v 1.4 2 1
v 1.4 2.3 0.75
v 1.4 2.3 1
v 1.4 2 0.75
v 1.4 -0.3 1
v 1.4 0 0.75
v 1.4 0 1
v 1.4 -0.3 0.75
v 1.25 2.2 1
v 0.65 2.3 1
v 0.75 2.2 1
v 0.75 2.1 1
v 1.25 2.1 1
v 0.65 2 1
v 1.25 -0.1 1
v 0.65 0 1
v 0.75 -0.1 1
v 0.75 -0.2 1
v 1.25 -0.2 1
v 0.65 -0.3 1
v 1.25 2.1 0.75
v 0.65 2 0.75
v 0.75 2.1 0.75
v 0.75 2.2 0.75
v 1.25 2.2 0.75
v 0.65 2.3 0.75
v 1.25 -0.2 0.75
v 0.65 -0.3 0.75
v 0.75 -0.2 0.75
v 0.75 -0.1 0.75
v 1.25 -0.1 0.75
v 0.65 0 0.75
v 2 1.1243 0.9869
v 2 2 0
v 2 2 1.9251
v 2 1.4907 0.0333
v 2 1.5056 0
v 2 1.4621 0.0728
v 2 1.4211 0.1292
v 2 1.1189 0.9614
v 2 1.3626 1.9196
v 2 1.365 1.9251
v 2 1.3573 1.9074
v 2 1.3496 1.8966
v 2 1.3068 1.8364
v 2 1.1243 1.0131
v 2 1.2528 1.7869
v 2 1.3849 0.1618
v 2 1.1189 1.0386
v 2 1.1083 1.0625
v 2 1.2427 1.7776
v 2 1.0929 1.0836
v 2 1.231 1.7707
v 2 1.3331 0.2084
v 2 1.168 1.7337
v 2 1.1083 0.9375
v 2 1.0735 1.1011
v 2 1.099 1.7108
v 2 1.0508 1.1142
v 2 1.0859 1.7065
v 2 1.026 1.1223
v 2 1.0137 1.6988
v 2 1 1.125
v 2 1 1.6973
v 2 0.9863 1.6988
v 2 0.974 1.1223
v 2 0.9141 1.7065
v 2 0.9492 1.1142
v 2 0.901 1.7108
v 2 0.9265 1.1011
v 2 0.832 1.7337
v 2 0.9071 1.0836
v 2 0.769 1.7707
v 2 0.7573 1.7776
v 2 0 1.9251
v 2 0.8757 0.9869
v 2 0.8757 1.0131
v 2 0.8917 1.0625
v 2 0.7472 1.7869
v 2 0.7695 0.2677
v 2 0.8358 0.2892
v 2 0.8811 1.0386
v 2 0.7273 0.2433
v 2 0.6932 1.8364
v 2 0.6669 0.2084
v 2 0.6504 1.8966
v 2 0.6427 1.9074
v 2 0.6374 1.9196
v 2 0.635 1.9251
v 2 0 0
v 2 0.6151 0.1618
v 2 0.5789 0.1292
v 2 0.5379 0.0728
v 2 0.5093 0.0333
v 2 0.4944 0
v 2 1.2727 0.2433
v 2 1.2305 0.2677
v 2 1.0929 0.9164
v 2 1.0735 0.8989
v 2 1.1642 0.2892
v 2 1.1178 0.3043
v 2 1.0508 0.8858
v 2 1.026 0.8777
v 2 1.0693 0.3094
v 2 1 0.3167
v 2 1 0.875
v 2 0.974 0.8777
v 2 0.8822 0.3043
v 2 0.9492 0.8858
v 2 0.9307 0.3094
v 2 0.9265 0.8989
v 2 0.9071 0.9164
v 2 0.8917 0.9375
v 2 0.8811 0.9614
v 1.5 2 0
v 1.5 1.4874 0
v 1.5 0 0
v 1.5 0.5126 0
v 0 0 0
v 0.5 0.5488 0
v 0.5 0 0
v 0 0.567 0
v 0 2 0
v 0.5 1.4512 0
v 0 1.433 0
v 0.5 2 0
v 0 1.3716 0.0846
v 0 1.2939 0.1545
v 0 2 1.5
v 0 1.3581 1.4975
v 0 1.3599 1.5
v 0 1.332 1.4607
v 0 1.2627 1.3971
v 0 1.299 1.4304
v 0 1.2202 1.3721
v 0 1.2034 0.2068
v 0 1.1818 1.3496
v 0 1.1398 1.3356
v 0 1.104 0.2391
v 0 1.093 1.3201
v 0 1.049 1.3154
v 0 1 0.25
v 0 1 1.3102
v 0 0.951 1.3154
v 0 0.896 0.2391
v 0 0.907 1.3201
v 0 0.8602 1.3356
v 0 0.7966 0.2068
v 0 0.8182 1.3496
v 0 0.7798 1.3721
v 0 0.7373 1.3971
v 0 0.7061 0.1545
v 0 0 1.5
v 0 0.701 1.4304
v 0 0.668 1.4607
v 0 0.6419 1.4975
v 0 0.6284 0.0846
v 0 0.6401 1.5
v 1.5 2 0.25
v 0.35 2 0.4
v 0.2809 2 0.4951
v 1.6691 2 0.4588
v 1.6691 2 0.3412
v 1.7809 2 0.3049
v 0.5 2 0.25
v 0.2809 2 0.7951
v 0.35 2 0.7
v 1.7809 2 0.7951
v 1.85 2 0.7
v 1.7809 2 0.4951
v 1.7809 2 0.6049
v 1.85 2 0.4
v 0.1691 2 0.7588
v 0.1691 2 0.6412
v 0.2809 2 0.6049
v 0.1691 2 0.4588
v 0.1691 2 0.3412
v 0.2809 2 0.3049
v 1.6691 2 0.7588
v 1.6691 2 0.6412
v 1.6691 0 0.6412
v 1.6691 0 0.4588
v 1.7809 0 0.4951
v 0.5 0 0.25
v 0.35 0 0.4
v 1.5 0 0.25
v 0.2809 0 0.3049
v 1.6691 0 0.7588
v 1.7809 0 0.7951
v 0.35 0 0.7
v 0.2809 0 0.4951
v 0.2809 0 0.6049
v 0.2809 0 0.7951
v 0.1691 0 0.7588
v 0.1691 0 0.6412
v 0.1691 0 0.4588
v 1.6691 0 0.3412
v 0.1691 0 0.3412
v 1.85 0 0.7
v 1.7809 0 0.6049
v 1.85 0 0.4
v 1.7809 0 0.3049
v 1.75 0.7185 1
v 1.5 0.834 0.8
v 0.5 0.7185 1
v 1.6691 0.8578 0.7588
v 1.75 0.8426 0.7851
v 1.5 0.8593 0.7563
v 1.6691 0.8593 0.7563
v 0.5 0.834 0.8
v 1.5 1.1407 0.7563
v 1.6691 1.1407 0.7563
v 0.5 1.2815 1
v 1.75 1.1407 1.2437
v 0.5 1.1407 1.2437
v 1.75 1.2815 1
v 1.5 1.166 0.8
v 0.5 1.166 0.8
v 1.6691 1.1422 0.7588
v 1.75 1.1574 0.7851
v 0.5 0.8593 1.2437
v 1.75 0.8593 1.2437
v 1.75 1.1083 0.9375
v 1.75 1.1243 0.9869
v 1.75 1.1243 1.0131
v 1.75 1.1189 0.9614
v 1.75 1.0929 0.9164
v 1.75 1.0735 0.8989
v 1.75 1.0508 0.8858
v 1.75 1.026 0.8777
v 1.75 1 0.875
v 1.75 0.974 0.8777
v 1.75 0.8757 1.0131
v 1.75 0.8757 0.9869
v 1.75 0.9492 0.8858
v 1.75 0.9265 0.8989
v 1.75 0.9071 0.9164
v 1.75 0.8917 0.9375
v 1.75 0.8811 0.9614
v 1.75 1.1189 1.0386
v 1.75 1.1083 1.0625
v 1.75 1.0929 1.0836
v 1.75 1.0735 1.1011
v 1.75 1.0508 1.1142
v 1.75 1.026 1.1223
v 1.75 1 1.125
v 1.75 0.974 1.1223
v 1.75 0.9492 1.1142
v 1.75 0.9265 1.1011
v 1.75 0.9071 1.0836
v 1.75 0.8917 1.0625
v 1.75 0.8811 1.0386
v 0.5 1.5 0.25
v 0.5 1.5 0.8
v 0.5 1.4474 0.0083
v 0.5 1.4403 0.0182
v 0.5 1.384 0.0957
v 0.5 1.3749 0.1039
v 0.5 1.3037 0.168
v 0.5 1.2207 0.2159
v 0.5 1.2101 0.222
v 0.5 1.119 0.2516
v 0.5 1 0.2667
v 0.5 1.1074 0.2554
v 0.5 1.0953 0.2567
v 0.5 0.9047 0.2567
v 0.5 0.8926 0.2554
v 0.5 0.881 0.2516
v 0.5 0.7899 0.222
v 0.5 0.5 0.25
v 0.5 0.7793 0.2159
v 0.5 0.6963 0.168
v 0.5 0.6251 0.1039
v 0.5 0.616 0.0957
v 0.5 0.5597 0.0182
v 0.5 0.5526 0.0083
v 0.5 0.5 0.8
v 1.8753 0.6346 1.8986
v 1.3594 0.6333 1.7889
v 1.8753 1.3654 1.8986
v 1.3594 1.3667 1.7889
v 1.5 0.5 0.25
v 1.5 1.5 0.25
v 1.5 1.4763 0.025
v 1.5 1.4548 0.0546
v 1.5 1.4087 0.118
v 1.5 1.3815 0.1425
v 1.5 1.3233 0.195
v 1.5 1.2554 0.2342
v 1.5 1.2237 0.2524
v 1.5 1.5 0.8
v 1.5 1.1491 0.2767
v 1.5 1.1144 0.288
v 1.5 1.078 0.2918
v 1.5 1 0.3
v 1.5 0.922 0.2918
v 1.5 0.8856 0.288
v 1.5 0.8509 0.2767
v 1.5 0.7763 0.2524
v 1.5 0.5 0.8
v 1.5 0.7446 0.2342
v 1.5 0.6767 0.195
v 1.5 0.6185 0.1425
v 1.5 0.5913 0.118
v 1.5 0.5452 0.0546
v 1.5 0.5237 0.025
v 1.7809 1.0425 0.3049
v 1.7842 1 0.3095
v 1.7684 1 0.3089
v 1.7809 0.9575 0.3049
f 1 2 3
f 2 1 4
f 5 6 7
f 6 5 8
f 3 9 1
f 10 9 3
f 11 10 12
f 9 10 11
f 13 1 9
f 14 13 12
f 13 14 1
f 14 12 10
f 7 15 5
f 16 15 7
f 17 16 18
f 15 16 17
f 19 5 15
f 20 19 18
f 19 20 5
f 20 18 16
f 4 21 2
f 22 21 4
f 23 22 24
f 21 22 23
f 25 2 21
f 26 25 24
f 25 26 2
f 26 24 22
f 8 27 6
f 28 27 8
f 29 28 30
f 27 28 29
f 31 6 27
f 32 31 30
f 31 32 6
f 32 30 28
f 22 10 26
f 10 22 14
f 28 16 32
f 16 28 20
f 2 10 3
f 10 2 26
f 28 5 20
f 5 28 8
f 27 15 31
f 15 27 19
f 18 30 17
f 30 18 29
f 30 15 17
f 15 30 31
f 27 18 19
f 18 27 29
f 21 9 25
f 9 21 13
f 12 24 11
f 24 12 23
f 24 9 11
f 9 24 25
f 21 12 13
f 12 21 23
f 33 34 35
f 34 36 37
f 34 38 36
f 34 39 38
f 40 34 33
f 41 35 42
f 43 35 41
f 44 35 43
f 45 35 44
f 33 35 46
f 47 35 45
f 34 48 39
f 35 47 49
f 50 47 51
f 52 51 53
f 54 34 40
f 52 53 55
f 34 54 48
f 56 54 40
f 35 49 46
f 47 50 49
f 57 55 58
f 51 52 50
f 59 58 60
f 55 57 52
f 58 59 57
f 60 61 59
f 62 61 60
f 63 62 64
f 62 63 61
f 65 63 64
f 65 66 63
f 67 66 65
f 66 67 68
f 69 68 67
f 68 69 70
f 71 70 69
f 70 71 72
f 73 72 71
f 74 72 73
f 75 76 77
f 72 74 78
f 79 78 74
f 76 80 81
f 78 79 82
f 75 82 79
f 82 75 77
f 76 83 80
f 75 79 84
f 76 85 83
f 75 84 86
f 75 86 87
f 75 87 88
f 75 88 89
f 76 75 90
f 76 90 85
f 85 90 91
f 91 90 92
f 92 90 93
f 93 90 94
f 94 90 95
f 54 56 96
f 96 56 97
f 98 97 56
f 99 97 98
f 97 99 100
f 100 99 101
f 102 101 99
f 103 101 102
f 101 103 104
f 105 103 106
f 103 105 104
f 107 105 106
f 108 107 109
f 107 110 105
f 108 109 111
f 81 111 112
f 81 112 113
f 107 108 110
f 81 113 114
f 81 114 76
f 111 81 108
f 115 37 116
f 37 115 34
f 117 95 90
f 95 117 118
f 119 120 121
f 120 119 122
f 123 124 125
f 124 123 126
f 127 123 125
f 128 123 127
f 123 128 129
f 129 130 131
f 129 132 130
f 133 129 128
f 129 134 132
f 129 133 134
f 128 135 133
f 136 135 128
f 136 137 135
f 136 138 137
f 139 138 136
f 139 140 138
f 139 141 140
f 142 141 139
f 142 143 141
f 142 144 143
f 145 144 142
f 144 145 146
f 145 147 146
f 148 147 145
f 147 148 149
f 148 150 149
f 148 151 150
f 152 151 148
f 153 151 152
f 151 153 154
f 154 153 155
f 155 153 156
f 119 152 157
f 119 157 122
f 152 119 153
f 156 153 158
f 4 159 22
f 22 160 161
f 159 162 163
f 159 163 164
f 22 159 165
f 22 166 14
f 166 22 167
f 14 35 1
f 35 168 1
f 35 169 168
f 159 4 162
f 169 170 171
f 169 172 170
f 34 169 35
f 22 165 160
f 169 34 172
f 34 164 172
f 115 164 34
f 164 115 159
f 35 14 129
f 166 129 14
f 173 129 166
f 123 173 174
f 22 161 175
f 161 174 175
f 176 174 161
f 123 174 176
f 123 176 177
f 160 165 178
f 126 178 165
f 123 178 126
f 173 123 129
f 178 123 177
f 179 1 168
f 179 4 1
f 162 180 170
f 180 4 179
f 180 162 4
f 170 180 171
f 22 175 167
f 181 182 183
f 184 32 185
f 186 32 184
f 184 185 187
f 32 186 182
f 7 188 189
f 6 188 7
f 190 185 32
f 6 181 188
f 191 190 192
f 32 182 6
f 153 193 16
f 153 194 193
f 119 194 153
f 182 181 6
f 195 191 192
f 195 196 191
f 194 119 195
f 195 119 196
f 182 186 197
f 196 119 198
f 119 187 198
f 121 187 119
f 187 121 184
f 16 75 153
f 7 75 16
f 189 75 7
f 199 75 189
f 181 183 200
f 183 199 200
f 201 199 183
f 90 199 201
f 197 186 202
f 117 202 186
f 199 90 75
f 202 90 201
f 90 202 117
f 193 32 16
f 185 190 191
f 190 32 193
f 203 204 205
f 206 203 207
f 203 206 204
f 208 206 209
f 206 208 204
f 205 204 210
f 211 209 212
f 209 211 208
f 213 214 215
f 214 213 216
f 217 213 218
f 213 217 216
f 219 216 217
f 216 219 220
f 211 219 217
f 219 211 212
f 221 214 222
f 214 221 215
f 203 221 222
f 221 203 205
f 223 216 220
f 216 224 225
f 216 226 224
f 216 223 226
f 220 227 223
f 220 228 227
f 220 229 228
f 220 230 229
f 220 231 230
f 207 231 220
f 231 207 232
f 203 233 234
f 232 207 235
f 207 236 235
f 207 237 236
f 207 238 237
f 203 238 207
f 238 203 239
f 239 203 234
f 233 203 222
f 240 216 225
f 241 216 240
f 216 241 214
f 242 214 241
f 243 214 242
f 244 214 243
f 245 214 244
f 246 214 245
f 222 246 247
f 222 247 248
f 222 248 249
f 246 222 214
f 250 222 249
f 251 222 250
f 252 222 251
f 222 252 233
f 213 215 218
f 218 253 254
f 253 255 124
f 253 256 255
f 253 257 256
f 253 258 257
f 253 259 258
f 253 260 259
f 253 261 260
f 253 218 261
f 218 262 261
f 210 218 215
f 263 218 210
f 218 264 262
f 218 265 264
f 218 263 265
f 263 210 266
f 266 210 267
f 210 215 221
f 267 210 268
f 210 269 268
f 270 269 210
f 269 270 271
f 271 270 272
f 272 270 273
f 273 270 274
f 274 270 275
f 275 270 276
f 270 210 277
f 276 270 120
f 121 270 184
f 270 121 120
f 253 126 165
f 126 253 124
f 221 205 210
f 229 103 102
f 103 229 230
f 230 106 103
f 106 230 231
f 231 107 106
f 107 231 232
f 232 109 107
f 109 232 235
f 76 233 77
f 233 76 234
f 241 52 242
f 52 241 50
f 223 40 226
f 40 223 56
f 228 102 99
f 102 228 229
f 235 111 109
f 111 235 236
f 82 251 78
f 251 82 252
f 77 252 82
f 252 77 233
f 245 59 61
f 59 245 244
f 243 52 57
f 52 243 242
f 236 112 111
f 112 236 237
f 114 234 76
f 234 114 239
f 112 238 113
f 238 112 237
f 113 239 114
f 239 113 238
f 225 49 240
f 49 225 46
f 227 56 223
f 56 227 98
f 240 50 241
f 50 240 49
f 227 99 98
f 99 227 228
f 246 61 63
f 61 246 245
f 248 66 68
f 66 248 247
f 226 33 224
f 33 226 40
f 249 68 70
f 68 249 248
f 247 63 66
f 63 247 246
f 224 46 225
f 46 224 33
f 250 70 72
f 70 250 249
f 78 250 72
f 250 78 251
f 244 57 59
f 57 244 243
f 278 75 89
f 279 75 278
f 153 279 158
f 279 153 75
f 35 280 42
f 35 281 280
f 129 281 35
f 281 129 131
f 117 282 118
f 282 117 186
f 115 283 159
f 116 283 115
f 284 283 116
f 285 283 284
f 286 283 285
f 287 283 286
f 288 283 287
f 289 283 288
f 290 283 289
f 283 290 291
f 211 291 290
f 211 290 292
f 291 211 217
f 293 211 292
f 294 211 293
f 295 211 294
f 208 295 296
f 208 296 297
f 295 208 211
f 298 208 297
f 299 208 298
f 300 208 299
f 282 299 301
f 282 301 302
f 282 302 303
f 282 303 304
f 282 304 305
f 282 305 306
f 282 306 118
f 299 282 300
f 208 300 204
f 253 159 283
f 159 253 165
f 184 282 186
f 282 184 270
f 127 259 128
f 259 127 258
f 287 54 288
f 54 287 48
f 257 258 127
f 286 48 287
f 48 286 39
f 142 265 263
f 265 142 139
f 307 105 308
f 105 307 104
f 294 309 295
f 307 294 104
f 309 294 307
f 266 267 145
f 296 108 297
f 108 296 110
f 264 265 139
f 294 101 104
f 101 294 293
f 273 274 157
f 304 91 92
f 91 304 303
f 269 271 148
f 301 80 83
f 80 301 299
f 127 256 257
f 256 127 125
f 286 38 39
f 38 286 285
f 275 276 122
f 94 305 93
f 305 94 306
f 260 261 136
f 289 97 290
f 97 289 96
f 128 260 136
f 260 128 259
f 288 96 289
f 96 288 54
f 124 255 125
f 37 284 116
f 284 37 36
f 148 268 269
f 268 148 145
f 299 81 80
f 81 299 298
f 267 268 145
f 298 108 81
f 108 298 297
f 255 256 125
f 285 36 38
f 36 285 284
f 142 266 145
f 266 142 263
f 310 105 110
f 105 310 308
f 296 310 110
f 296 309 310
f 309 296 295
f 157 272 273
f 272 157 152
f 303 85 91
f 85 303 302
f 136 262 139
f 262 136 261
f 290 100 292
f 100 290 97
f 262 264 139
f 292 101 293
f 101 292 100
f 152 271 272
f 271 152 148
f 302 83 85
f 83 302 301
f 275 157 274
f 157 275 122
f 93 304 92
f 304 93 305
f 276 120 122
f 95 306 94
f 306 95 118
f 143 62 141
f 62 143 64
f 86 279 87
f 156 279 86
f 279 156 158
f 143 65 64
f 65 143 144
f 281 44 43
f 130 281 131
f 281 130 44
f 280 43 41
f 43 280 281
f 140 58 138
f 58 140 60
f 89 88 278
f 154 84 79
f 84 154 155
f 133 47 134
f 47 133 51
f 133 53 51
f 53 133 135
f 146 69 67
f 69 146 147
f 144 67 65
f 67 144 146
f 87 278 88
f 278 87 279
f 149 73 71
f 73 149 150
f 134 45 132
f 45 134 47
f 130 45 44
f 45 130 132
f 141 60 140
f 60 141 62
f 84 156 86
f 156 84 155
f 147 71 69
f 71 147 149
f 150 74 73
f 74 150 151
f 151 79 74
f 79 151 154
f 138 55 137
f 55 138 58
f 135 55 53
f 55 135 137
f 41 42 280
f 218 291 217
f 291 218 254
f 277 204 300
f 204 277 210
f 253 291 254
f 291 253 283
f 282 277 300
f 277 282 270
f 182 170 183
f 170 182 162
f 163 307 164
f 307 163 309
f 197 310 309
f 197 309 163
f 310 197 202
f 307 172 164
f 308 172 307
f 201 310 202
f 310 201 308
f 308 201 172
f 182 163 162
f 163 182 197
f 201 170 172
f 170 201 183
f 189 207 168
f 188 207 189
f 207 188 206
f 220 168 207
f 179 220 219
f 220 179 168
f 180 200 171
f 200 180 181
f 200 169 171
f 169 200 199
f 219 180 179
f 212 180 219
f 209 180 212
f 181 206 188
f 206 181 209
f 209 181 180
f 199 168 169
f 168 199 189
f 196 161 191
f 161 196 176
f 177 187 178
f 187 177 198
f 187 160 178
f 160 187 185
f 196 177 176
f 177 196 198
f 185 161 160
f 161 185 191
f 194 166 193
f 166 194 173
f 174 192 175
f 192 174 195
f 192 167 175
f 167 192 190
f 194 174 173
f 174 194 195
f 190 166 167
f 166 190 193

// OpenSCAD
// Trying to be a trekking pole camera mount
// jellsworth Dec 2014
//
// units = inches

use <Libs.scad>;


difference() {
	union(){
		// base block
		translate([0, 0, 0]) {
			cube([ 2, 2, 2 ], false);
		}

		// add strap supports
		difference() {
			// add strap base
			translate( [0.65, -0.3, 0.75]) {
				cube([ 0.75, 2.6, 0.25]);
			}
			
			// cut strap holes
			translate([0.75, -0.2, 0]){
				cube([0.5, 0.1, 2], false);
			}
			translate([0.75, 2.1, 0]){
				cube([0.5, 0.1, 2], false);
			}
		}
	}



	// remove wedge
	translate([ 0, 0, 1.5]) {
		rotate([ 0, -12, 0]) {
			cube([ 3, 2, 1 ], false);
		}
	}

	// remove cross-cut
	translate([ 0.5, -0.5, 0]) {
		cube([ 1, 3, 0.25 ], false);
	}


	// remove pole channel 1
	translate([ 0, 1, -0.25]) {
		rotate([ 0, 90, 0]) {
			cylinder(h = 6, r1 = 0.5, r2 = 0.7, center = false, $fn=30);
		}
	}

	// remove pole channel 2
	translate([ -3.2, 1, 1.2]) {
		rotate([ 0, 80, 0]) {
			cylinder(h = 6, r1 = 0.5, r2 = 0.4, center = false, $fn=30);
		}
	}


	//cut hole for bolt
	//1/4" - 20 x 3/4" (w/ 7/16" head)
	translate([0.5 + 1.25/2, 1, 1]){
		rotate([0, 90, 0]){
			rotate(30, 0, 0){
				// small extra space for 7/16 hex head bolt
				hex(7/16 + 0.05, 1.25, true, true );
			}
			cylinder(h = 2, d=1/4, $fn=30);
		}
	}

	//cut bolt access
	translate([0.5, 0.5, 0]){
		cube([ 1, 1, 0.8]);
	}
	
	//reduce volume
	// upper block - bottom row
	translate([1.75, -0.5, 0.4]){
		vhole();
	}
	// upper block - middle row
	translate([1.75, -0.5, 0.7]){
		vhole();
	}
	// lower block - bottom row
	translate([0.25, -0.5, 0.4]){
		vhole();
	}
	// lower block - middle row
	translate([0.25, -0.5, 0.7]){
		vhole();
	}


}

module vhole() {
		rotate([-90, 0, 0]){
			cylinder(h = 3, d=0.2, $fn=5);
		}
}
